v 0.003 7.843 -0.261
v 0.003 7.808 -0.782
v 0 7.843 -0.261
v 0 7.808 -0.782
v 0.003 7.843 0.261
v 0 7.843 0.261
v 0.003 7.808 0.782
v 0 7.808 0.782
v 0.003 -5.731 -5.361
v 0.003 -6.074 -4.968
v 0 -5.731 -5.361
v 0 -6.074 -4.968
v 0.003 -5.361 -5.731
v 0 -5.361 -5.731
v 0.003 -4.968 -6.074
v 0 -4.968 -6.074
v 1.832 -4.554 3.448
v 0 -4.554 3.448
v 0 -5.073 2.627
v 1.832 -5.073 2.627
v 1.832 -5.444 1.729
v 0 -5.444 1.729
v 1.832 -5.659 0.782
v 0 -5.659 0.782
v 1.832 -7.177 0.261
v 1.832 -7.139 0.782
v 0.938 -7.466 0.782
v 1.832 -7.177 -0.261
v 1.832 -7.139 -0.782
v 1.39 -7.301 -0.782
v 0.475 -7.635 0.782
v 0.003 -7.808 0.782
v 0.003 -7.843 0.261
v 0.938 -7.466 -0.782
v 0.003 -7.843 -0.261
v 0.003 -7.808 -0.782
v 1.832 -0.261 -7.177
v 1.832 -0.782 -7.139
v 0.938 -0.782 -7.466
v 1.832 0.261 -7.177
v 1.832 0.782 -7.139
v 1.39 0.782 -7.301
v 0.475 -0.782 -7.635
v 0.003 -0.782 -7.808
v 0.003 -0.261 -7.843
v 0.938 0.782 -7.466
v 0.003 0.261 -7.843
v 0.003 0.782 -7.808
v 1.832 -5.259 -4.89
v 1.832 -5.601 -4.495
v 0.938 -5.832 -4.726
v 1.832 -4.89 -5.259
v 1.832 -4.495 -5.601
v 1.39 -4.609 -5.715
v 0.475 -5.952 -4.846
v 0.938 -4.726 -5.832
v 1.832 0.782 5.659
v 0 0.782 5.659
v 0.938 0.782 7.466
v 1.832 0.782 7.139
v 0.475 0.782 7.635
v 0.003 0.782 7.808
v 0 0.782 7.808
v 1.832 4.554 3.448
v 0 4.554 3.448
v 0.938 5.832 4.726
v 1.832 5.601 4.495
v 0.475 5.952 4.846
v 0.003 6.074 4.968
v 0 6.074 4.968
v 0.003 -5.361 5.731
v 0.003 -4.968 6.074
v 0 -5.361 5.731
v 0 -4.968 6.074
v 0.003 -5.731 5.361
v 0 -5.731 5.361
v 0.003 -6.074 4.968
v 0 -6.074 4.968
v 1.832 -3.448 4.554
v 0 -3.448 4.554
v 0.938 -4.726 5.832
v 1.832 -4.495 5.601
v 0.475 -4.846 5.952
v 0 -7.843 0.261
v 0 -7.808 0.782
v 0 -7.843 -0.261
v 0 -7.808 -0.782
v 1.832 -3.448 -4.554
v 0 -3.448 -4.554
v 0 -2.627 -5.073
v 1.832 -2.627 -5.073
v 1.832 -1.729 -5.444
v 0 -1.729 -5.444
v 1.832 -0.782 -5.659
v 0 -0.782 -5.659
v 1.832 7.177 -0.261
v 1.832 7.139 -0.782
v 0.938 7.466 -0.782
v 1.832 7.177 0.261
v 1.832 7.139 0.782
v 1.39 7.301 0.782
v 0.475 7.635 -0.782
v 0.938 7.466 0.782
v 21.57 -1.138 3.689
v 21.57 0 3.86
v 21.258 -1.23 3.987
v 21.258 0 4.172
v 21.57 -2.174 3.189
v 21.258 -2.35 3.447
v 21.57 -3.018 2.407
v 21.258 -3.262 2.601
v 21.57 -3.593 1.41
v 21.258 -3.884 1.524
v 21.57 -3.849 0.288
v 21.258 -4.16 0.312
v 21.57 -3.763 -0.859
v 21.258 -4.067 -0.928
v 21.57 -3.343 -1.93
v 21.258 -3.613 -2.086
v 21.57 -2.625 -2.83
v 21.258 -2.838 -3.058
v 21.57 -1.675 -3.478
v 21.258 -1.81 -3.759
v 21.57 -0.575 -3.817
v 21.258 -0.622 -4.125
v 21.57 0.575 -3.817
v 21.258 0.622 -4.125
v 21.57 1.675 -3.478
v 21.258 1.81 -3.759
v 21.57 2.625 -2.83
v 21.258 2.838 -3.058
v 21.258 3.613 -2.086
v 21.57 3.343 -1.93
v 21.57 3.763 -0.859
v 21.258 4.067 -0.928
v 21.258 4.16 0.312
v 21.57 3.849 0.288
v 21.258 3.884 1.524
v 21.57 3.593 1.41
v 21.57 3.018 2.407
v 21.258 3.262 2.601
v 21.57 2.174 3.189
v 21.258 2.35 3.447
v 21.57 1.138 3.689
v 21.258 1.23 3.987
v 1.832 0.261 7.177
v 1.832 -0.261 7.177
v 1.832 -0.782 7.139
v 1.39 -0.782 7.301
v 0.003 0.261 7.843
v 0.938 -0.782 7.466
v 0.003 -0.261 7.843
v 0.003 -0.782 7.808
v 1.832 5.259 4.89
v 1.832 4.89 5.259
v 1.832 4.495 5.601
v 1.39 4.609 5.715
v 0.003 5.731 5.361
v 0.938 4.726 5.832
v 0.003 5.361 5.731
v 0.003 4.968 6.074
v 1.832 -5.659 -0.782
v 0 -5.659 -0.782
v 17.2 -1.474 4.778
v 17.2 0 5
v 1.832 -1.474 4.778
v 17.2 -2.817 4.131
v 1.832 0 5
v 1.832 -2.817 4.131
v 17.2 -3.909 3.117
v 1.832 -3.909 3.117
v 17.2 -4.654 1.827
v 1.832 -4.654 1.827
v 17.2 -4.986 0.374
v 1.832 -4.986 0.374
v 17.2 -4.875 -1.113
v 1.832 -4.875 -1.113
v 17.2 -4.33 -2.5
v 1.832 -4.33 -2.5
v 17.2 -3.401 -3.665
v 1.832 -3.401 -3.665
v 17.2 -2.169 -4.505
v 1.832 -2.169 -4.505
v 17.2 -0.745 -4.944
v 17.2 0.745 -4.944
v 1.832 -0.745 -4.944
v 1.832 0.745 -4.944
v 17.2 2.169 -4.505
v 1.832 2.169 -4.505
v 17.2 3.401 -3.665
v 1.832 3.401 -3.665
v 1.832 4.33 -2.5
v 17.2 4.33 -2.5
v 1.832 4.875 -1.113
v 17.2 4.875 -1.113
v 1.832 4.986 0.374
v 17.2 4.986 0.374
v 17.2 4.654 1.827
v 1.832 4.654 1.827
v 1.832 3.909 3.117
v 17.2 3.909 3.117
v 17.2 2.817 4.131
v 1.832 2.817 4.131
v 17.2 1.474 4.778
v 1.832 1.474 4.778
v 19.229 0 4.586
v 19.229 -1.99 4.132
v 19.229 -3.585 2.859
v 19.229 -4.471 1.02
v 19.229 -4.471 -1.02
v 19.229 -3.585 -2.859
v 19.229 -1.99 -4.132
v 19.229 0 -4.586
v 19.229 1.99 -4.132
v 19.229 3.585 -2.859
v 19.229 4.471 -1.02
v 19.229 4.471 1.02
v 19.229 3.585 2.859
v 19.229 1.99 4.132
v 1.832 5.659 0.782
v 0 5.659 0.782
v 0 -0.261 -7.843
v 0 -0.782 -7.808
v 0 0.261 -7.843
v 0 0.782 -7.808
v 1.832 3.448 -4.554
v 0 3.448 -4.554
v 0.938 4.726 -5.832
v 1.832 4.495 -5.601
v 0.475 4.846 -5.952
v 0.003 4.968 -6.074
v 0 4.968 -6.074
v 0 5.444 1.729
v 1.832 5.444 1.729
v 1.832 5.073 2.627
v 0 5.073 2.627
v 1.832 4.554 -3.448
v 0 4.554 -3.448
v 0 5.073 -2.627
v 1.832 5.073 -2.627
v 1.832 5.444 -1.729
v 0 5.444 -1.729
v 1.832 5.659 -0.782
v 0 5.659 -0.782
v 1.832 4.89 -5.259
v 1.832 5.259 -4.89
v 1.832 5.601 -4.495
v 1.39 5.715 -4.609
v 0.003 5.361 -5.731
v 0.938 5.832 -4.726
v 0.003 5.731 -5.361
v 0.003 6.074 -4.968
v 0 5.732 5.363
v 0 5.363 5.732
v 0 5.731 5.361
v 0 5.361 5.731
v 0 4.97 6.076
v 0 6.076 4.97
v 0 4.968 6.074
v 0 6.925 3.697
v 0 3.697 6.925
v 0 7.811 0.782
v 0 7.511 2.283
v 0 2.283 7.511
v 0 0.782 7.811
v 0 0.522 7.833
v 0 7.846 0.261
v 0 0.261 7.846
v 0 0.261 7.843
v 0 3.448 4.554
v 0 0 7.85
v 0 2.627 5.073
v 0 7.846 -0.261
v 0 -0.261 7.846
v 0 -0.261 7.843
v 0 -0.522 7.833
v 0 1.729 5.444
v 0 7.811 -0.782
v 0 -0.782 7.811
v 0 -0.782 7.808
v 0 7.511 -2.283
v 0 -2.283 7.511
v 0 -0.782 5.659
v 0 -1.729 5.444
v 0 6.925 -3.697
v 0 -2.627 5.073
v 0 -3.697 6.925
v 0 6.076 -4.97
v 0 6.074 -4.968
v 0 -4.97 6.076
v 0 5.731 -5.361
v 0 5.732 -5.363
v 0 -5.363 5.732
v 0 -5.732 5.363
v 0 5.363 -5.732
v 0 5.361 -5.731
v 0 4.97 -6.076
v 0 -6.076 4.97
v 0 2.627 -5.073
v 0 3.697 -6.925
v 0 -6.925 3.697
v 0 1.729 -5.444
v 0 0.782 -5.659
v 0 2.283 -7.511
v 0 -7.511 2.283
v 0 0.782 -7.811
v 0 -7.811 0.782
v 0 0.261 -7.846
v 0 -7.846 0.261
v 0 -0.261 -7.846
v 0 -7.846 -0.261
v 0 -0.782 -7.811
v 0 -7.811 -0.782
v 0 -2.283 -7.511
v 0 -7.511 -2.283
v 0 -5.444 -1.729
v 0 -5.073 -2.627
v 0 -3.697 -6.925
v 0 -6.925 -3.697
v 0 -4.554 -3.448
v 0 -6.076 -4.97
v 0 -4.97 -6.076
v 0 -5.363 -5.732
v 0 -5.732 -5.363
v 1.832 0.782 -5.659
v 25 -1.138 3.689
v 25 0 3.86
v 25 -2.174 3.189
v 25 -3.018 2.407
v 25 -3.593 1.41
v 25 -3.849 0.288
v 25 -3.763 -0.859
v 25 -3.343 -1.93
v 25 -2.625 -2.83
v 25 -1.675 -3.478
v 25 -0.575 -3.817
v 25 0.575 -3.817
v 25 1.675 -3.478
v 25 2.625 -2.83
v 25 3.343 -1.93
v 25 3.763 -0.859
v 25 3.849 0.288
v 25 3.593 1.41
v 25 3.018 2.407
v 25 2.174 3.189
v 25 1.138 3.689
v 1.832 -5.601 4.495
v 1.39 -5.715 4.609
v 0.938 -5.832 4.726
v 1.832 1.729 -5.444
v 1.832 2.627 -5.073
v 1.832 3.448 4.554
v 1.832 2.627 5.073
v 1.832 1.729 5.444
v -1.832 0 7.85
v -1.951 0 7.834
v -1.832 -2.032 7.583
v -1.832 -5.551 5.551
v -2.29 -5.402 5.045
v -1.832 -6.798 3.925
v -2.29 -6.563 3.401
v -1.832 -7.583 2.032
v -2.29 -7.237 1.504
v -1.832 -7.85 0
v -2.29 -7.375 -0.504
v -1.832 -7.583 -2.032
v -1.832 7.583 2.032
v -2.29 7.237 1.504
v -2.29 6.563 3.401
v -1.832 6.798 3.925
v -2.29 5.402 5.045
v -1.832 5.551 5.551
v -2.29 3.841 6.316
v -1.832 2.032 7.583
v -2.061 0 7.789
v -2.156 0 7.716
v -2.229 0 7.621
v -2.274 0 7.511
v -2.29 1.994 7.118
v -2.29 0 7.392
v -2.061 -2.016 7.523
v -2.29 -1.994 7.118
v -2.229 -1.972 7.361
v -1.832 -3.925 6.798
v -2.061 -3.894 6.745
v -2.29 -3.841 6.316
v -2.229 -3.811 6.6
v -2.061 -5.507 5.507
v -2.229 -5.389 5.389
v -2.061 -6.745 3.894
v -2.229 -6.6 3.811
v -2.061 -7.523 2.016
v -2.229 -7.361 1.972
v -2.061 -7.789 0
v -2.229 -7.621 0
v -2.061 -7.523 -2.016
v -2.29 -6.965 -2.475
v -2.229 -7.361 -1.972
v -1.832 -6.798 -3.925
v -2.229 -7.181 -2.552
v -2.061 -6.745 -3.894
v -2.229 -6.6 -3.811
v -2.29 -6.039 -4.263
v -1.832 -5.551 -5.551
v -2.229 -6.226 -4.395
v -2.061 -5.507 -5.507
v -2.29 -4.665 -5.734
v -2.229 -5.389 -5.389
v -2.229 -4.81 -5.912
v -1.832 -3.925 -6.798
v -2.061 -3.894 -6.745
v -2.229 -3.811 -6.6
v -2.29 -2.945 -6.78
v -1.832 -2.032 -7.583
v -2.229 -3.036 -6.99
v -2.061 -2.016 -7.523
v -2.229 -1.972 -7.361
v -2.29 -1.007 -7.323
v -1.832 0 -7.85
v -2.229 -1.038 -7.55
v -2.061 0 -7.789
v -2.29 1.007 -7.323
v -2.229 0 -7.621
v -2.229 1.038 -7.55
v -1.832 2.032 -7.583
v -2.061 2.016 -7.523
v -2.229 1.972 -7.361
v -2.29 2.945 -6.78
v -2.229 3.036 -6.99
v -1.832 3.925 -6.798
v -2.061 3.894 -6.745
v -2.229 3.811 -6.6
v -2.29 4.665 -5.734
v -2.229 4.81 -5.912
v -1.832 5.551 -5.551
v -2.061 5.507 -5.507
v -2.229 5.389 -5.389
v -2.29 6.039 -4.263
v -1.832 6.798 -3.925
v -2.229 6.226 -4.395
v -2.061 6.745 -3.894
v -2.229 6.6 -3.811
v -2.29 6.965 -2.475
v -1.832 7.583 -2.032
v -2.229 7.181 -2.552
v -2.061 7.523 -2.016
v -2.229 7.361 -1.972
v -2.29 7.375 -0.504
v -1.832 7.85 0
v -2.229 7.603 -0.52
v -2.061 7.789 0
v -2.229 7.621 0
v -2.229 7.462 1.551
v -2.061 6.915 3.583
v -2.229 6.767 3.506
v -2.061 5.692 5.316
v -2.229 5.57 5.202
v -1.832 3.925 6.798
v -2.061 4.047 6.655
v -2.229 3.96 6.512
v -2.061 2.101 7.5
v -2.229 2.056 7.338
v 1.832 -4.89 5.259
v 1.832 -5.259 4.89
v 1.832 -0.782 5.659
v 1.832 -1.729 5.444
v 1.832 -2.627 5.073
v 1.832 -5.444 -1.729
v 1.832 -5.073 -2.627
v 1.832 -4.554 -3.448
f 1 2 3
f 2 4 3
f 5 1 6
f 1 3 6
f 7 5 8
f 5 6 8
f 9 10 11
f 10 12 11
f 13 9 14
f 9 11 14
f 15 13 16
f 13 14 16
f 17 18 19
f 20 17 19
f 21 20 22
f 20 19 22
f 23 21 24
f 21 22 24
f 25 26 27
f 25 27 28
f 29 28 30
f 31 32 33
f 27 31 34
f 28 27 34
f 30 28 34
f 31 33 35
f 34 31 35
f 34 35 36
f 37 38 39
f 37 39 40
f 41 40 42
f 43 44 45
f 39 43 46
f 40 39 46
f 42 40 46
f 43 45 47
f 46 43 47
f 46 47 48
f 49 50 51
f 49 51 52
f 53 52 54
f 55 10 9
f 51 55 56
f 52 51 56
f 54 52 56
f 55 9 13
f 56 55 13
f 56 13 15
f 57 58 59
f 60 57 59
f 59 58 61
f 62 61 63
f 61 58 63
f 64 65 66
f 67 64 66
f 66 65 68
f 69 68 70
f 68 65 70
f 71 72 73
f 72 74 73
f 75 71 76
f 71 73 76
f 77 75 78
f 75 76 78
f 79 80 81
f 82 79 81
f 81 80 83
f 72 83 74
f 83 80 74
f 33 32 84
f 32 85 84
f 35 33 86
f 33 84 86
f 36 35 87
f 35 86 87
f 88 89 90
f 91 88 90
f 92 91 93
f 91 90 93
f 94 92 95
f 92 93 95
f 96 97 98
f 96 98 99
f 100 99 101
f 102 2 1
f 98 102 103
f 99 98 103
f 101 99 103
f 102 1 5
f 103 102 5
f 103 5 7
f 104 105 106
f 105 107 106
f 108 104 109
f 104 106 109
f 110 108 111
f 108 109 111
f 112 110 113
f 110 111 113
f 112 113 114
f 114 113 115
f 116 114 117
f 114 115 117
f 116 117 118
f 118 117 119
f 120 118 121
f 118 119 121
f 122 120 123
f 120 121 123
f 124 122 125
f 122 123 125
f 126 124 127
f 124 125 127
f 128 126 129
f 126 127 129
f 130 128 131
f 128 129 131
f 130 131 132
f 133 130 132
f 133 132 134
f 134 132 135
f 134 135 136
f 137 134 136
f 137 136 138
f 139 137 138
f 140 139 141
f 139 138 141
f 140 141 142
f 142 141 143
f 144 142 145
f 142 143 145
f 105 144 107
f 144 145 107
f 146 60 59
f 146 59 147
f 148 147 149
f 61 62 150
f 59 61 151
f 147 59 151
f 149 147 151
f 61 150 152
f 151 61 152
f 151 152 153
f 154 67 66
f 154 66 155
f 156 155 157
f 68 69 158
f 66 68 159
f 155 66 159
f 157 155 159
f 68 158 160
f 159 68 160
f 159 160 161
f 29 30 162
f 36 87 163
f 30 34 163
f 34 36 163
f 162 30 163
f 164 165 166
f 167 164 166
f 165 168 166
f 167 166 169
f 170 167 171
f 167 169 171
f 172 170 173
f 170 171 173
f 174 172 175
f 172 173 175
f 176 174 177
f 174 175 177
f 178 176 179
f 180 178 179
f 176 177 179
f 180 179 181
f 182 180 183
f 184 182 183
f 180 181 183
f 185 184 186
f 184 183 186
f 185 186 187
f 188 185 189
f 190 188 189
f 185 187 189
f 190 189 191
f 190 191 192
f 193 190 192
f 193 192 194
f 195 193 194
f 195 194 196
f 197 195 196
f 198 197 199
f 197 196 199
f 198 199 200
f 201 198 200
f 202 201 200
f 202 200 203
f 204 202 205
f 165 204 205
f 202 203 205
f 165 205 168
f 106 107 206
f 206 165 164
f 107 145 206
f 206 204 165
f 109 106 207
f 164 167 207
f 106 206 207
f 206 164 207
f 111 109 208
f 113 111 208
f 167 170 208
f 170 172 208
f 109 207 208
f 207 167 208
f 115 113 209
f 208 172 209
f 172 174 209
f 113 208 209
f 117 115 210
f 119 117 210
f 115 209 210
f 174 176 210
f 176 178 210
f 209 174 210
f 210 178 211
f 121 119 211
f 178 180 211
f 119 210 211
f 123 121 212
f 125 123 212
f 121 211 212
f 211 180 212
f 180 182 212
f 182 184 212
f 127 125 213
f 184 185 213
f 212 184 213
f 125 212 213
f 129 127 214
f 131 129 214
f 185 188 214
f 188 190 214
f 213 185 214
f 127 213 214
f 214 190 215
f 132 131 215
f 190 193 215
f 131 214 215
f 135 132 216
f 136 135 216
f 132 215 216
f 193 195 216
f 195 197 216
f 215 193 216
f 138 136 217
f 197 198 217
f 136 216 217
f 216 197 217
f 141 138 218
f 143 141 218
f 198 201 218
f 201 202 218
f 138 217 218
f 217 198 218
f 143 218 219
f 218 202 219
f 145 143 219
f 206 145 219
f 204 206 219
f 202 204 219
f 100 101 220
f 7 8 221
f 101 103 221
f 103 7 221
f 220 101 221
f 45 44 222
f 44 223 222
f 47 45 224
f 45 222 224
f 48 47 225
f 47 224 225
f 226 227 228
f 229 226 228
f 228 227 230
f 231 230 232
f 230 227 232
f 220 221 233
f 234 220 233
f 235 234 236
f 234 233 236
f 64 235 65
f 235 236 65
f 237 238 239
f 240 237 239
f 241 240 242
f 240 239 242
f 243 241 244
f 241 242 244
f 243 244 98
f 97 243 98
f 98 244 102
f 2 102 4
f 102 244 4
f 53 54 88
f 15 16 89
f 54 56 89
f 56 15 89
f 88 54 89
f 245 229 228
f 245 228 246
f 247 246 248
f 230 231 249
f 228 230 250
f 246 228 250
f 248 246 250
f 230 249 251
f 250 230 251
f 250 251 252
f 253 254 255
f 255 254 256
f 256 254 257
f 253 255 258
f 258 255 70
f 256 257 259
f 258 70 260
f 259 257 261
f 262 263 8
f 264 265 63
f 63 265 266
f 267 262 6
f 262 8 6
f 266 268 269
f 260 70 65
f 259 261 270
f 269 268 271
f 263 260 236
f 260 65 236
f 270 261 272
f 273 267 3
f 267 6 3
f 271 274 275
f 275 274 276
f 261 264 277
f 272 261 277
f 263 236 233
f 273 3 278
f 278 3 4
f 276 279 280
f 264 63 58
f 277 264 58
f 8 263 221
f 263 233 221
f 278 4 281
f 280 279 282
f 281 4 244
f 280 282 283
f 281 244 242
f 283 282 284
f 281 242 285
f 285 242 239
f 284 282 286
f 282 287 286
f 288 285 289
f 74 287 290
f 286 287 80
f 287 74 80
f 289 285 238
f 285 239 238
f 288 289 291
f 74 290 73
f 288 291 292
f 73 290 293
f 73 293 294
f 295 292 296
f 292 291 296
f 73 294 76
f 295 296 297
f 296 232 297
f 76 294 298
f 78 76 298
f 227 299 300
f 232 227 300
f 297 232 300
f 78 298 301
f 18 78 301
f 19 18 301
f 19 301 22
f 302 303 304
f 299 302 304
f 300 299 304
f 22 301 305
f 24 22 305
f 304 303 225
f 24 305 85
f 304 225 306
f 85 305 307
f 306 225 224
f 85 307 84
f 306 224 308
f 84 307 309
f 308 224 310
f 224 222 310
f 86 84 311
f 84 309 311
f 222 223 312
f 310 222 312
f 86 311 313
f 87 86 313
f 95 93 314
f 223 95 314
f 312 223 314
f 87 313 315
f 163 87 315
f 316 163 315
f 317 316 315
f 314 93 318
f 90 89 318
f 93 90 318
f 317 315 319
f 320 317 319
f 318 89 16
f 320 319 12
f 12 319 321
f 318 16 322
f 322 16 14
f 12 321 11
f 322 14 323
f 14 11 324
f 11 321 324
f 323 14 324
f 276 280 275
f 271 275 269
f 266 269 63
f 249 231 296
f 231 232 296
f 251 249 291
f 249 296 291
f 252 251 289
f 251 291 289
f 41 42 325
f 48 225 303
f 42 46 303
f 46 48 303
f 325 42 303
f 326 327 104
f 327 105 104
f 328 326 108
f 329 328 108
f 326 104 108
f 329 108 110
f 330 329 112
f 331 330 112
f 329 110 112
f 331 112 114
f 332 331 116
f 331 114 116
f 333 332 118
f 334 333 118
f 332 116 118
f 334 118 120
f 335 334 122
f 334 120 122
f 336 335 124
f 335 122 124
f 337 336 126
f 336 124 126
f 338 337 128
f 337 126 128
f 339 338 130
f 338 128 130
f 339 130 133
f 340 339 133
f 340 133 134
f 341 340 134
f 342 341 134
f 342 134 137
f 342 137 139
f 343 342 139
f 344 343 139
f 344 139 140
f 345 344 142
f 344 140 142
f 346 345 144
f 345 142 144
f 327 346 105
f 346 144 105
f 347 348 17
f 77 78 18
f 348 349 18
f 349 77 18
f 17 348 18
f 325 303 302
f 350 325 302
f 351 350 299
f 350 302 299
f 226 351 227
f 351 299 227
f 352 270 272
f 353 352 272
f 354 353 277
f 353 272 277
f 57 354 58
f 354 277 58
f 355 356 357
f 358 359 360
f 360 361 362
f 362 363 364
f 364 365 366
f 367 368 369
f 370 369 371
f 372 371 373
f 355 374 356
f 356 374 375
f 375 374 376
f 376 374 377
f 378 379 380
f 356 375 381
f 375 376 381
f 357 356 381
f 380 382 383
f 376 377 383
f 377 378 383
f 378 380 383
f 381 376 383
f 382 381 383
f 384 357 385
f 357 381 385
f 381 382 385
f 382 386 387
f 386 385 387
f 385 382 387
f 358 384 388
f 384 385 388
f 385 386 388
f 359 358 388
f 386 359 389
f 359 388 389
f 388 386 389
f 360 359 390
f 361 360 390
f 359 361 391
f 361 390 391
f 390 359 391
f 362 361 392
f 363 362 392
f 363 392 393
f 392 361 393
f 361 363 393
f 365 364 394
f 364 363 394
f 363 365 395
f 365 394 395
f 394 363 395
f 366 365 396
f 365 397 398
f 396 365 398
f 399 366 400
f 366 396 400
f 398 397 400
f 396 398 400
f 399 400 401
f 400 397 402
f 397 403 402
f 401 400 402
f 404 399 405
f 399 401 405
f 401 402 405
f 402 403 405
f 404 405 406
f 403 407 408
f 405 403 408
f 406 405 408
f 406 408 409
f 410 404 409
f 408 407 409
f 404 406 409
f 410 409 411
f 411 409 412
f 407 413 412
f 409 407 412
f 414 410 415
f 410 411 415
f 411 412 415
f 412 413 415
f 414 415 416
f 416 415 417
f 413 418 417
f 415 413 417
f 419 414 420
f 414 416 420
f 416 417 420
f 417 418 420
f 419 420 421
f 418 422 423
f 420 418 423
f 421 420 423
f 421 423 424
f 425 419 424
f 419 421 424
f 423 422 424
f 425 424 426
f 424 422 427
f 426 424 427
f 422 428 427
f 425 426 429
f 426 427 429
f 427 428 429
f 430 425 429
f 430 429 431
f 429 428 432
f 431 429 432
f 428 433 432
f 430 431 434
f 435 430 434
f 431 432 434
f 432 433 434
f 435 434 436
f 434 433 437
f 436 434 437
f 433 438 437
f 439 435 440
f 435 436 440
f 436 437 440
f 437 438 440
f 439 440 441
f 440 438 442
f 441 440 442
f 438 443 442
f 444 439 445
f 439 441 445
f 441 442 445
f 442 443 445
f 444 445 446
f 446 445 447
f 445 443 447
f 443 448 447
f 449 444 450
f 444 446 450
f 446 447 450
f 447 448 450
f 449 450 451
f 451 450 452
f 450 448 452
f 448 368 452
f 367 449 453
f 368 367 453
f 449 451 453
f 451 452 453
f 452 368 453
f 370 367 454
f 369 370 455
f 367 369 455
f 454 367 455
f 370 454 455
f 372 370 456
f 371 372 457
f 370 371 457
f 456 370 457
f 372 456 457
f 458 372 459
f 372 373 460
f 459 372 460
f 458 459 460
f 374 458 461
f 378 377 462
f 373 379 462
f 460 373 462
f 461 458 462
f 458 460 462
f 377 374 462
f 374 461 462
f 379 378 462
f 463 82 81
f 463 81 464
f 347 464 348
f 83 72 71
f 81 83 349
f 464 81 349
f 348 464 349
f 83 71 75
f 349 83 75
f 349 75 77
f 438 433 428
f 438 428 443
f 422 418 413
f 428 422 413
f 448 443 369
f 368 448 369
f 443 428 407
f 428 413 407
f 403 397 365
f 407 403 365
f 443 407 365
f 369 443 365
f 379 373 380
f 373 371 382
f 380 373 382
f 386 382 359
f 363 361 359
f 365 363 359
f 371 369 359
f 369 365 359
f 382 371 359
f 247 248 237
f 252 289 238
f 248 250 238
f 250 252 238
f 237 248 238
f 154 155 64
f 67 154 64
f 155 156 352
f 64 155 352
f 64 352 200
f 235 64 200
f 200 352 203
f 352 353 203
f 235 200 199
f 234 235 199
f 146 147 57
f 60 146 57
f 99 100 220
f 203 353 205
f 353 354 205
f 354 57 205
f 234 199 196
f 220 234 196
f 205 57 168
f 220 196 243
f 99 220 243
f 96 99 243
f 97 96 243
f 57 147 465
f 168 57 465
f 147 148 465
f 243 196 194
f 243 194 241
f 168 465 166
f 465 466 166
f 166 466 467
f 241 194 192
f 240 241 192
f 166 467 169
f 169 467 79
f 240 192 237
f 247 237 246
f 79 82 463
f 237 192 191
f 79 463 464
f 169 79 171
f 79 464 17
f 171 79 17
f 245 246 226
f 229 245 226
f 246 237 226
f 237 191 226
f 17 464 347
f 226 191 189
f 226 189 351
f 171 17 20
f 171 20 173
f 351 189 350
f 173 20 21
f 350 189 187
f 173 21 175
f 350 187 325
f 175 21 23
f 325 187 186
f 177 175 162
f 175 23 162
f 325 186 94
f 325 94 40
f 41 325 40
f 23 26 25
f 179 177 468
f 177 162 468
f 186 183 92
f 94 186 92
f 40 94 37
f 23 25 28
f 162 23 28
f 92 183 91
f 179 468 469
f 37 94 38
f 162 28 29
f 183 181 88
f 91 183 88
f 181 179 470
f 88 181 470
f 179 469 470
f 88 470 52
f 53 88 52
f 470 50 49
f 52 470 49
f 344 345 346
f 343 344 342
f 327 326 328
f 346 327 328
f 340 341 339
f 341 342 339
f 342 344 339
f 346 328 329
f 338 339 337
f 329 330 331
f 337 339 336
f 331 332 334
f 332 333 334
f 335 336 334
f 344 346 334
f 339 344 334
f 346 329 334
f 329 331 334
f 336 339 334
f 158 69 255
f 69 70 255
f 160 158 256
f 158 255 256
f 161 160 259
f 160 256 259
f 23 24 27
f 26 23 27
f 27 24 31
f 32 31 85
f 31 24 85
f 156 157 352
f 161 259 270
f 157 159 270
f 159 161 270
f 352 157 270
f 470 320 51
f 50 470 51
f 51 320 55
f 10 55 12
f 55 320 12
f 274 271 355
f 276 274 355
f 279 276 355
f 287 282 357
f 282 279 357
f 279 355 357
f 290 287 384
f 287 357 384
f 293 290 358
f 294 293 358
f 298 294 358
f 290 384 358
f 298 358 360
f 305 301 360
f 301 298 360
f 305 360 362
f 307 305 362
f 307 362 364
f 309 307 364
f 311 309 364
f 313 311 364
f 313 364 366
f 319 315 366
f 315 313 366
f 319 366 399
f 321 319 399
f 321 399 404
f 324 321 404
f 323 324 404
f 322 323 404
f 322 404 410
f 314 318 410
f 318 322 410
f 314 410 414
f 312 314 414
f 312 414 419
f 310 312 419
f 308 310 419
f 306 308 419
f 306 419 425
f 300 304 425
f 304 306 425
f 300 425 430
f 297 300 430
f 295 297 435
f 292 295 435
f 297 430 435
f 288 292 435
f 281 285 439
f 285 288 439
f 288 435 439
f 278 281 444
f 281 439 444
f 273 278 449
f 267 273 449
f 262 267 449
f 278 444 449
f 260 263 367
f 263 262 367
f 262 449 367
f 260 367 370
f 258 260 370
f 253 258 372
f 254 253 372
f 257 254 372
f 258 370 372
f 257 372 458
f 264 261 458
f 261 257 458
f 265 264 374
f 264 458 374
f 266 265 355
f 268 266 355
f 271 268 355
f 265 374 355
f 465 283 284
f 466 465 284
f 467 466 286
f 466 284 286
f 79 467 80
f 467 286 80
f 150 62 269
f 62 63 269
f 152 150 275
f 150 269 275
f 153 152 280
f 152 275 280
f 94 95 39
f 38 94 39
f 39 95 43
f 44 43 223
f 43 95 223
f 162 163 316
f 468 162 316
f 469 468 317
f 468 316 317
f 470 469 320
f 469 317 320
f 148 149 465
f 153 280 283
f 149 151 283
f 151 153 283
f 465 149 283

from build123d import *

# Parameters (mm, degrees)
RIBCUT_START     = -1.832
RIBCUT_DEPTH     = 1.832
RIBCUTSPAT_COUNT = 8
RIBCUTSPAT_ANGLE = 315


with BuildPart() as part:
    # BodySke → BaseBody (revolve)
    with BuildSketch(Plane.XY, mode=Mode.PRIVATE) as basebody_sk:
        with BuildLine():
            Line((-2.29, 7.392), (-2.29, 0))
            Line((-2.29, 0), (25, 0))
            Line((25, 0), (25, 3.86))
            Line((25, 3.86), (21.57, 3.86))
            Line((21.57, 3.86), (21.258, 4.172))
            Line((21.258, 4.172), (17.2, 5))
            Line((17.2, 5), (1.832, 5))
            Line((1.832, 5), (1.832, 7.181591015))
            Line((1.832, 7.181591015), (0.00254, 7.84746))
            Line((0.00254, 7.84746), (0, 7.84746))
            Line((0, 7.84746), (0, 7.85))
            Line((0, 7.85), (-1.832, 7.85))
            ThreePointArc((-1.832, 7.85), (-2.155854906, 7.715854906), (-2.29, 7.392))
        make_face()
    revolve(basebody_sk.sketch.rotate(Axis((0, 0, 0), (1, 0, 0)), 90), axis=Axis((0, 0, 0), (1, 0, 0)))

    # RibCutSke → RibCut (cut)
    with BuildSketch(Plane(origin=(1.832, 1.794401132, -0.090952894), x_dir=(0, 0, -1), z_dir=(1, 0, 0)).offset(RIBCUT_START)):
        with BuildLine():
            Line((0.691219431, 3.864296837), (0.691219431, 6.016533924))
            ThreePointArc((0.691219431, 6.016533924), (2.91311205, 5.458053198), (4.879132896, 4.281843369))
            Line((4.879132896, 4.281843369), (3.357271457, 2.759981929))
            ThreePointArc((3.357271457, 2.759981929), (2.095126213, 3.483260697), (0.691219431, 3.864296837))
        make_face()
    ribcut = extrude(amount=RIBCUT_DEPTH, mode=Mode.SUBTRACT)

    # RibCutsPat: RibCut ×8 about axis
    ribcutspat_axis = Axis((0, 0, 0), (1, 0, 0))
    for i in range(1, RIBCUTSPAT_COUNT):
        add(ribcut.rotate(ribcutspat_axis, i * RIBCUTSPAT_ANGLE / (RIBCUTSPAT_COUNT - 1)), mode=Mode.SUBTRACT)


solid = part.part
